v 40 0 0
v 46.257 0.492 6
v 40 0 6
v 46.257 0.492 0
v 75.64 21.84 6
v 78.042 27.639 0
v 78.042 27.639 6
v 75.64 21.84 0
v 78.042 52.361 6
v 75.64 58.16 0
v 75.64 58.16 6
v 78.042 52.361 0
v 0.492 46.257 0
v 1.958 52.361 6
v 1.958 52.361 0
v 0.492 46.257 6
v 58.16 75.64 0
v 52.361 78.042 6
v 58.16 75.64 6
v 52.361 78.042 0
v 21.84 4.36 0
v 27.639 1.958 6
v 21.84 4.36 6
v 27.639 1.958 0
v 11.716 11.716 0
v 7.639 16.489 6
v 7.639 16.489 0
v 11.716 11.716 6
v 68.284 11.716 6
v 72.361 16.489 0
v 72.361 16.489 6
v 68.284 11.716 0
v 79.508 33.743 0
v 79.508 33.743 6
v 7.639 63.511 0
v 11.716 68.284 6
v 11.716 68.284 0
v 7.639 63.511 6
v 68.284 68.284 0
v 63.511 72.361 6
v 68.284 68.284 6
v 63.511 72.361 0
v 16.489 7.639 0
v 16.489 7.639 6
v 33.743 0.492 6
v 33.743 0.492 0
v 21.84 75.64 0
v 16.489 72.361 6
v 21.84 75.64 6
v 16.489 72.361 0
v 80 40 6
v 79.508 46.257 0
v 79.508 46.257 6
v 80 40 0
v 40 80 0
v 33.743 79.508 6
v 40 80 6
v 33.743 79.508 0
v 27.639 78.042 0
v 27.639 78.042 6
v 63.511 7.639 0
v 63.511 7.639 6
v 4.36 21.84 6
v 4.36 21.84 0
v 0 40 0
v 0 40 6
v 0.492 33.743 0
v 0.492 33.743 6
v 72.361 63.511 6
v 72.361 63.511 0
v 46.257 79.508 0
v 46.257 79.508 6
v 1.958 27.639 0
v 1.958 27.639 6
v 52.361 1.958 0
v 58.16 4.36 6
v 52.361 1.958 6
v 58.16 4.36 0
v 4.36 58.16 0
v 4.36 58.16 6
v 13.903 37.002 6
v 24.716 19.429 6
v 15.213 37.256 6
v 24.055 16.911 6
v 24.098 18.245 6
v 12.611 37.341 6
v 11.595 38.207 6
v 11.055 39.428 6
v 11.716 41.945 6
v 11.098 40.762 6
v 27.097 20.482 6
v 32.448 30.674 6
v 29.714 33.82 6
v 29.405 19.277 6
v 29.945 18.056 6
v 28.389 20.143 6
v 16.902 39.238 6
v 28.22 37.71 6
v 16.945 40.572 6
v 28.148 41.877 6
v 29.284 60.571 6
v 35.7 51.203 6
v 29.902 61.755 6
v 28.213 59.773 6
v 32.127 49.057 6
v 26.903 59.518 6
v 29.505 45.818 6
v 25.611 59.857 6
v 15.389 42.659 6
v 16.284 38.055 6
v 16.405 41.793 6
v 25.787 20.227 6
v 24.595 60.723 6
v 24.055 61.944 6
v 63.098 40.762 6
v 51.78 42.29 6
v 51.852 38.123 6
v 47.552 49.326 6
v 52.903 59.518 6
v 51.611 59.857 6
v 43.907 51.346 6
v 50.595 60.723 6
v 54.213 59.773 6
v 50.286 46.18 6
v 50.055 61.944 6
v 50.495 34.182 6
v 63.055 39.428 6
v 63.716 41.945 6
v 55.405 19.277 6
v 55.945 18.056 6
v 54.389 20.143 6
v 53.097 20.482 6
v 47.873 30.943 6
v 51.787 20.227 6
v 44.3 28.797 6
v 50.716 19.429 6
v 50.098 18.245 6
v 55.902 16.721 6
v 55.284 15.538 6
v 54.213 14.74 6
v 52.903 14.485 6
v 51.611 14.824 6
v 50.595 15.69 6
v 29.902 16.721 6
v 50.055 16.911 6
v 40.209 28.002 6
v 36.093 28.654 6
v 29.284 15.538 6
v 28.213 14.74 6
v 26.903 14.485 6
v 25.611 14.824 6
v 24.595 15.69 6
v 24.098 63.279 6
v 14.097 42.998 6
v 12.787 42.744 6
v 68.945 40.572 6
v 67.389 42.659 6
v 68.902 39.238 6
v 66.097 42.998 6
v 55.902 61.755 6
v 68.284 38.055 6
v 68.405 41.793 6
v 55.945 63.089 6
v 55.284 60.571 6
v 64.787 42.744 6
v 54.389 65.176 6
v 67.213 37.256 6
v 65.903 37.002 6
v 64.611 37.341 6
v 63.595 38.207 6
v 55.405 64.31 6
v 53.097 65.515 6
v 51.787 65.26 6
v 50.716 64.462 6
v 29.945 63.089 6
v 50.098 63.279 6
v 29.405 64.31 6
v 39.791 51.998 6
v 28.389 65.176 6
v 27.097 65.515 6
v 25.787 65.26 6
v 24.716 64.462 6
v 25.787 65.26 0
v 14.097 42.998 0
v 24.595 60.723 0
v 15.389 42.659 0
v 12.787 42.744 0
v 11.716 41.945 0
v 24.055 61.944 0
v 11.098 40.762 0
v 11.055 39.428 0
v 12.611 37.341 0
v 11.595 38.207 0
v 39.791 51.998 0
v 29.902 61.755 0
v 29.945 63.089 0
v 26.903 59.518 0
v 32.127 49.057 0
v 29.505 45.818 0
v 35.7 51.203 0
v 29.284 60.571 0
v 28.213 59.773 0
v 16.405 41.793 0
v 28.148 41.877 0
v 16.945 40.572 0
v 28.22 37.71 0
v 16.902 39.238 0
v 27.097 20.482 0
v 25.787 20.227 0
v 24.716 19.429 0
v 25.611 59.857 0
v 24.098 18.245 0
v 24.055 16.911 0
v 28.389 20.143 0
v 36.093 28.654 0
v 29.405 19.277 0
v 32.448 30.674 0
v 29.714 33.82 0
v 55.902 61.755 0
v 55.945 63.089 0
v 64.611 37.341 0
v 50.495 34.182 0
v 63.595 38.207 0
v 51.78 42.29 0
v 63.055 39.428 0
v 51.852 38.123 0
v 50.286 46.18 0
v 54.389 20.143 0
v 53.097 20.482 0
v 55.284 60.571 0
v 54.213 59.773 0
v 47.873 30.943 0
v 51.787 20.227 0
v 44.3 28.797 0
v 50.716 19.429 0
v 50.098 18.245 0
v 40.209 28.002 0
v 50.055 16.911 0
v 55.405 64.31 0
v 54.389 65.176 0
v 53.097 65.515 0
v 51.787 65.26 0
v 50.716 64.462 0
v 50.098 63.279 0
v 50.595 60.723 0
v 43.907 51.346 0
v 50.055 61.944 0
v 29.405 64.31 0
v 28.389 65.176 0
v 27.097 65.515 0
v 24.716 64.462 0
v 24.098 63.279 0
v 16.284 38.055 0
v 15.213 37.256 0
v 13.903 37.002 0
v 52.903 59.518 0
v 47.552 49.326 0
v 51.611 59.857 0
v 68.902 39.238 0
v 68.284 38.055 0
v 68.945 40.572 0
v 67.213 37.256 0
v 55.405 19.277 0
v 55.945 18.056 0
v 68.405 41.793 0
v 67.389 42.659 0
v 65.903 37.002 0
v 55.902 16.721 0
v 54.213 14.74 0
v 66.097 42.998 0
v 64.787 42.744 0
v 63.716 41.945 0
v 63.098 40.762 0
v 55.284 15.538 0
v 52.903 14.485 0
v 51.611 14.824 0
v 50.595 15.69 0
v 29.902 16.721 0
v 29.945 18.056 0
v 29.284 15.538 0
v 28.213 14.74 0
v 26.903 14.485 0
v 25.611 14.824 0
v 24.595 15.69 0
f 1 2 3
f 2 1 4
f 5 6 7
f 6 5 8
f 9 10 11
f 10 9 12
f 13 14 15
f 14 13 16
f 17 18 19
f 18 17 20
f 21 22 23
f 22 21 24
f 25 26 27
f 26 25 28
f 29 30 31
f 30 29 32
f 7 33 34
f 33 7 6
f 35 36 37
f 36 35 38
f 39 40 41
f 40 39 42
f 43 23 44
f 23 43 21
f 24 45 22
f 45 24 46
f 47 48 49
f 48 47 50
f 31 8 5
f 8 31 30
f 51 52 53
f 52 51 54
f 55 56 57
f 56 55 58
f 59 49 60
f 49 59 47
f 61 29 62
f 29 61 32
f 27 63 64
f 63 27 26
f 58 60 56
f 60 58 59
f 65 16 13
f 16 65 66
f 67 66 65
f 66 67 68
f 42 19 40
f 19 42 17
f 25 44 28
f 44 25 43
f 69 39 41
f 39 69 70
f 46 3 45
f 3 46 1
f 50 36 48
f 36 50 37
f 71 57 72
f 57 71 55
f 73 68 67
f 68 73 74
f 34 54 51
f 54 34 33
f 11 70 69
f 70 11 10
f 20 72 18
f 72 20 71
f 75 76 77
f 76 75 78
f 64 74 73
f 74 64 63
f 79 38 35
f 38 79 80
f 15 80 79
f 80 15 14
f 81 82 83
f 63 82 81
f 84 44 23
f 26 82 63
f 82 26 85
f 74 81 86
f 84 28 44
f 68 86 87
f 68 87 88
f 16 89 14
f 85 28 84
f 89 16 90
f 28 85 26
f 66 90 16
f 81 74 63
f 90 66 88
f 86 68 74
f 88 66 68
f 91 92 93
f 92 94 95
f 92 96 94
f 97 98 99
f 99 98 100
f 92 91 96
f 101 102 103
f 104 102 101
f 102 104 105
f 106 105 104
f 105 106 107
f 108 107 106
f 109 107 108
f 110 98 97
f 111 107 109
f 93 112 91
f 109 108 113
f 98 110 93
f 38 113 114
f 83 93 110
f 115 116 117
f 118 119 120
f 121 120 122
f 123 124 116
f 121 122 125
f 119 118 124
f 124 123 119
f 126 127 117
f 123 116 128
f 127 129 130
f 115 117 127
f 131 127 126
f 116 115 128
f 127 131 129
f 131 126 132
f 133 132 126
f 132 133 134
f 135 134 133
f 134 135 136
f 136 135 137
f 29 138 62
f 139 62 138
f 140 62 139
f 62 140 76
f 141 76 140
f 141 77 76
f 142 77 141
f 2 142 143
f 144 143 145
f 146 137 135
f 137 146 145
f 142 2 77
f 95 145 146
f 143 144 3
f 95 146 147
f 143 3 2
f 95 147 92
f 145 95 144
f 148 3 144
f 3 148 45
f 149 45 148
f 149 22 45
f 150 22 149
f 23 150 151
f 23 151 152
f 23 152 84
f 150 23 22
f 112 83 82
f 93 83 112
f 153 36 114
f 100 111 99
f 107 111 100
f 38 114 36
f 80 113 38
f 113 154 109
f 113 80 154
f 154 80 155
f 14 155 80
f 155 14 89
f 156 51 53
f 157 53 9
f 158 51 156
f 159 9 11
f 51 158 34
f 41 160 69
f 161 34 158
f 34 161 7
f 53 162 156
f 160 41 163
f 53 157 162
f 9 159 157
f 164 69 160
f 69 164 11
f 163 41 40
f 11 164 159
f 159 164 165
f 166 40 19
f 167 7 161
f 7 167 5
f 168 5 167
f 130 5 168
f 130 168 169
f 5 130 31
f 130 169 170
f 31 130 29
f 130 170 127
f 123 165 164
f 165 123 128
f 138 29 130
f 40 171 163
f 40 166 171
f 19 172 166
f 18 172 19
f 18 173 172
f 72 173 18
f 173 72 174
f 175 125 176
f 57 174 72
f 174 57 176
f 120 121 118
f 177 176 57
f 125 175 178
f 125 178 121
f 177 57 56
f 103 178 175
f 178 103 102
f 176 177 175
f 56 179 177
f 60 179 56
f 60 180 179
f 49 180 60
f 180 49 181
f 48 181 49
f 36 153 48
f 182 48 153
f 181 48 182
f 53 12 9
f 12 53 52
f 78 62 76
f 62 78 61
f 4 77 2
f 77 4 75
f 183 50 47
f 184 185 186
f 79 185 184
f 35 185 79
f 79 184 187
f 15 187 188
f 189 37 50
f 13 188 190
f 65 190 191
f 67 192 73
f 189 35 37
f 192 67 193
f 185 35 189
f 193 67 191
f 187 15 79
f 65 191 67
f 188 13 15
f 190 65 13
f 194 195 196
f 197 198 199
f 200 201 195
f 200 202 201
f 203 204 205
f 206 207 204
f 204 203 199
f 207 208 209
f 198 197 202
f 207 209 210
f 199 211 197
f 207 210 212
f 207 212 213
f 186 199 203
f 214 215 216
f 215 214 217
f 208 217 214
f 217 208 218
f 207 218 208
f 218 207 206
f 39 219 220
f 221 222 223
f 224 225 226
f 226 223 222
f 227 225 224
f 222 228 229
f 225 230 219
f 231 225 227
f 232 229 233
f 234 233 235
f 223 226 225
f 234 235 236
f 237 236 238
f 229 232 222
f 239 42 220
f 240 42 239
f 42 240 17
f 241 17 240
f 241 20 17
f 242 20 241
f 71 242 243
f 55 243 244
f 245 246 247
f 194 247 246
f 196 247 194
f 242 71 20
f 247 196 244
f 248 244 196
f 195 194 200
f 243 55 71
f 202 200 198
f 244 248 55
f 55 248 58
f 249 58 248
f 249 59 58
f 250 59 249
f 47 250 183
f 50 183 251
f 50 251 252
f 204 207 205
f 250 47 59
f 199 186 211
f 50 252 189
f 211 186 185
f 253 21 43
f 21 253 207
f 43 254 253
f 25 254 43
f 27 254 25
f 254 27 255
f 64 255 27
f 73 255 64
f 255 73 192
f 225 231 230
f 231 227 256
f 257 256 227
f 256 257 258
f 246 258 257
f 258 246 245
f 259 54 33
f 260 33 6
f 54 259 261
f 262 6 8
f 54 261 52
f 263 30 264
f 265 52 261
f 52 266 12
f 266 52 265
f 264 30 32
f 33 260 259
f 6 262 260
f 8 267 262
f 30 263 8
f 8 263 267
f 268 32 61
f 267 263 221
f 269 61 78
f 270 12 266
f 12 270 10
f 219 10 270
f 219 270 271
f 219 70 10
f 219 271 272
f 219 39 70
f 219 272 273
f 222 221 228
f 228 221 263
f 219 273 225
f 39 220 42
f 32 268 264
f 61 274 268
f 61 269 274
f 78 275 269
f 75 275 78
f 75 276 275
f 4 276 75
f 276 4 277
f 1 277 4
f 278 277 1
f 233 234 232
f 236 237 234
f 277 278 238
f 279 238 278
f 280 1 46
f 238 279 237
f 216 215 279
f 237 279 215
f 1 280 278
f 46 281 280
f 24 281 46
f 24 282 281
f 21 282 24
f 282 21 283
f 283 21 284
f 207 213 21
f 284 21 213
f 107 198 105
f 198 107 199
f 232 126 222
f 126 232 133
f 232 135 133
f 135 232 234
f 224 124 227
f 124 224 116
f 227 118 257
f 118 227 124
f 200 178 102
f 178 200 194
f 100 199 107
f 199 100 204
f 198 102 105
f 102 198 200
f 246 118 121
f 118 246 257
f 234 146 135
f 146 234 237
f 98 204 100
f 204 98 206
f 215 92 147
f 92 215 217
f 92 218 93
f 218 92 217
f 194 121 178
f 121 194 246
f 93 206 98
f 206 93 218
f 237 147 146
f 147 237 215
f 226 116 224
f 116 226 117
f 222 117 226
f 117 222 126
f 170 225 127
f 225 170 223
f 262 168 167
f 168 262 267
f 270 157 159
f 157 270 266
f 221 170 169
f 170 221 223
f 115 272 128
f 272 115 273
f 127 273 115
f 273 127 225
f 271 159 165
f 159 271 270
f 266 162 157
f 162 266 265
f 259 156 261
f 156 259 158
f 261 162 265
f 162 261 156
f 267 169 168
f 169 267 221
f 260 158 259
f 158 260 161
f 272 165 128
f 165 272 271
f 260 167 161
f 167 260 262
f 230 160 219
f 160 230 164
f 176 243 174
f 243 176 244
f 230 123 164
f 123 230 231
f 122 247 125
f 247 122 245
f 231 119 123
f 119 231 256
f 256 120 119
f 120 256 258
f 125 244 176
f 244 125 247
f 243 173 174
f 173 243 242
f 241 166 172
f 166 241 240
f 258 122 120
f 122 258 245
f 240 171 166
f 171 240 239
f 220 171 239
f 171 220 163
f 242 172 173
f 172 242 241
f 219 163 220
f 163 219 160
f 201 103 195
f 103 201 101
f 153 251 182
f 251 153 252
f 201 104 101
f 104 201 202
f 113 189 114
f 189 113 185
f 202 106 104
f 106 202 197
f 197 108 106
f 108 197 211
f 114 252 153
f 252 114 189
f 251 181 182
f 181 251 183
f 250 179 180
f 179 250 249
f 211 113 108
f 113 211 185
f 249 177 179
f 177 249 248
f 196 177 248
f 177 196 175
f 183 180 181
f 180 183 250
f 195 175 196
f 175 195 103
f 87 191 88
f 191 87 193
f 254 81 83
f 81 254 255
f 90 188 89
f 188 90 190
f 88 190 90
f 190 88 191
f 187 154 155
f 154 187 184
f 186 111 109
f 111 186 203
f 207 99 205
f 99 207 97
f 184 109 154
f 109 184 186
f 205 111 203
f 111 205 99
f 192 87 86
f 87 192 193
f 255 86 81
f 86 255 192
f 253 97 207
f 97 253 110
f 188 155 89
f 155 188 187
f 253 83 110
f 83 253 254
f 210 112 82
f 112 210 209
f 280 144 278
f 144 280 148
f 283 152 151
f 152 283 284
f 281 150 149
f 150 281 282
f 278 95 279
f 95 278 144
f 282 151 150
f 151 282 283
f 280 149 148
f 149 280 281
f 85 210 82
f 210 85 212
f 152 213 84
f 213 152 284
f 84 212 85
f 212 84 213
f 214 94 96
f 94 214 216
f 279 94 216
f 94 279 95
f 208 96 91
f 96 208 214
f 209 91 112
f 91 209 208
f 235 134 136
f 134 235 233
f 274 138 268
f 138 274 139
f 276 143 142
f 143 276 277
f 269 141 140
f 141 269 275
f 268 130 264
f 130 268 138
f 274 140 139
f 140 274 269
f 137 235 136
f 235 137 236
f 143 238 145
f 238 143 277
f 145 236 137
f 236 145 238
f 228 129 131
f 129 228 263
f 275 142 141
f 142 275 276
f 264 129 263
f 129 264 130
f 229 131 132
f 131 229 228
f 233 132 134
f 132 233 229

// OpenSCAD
$fn = 32;

// ----------------------------------------------------------------------
// Spacer plate: round flange R40, 6 bolts
// ----------------------------------------------------------------------

// --- parameters (mm) ---
bore_r = 12;              // centre bore radius
bolt_r = 3;               // bolt hole radius
plate_t = 6;              // plate thickness, Z (extrusion height)
flange_r = 40;            // flange radius
n_bolt = 6;               // bolt hole count
ring_r = 26;              // bolt circle radius
fit_tol = 0.02;           // declared fit tolerance (prompt contract)
free_tol = 0.2;           // declared free tolerance (prompt contract)

profile = [[80, 40], [79.508, 46.257], [78.042, 52.361], [75.64, 58.16], [72.361, 63.511], [68.284, 68.284], [63.511, 72.361], [58.16, 75.64], [52.361, 78.042], [46.257, 79.508], [40, 80], [33.743, 79.508], [27.639, 78.042], [21.84, 75.64], [16.489, 72.361], [11.716, 68.284], [7.639, 63.511], [4.36, 58.16], [1.958, 52.361], [0.492, 46.257], [0, 40], [0.492, 33.743], [1.958, 27.639], [4.36, 21.84], [7.639, 16.489], [11.716, 11.716], [16.489, 7.639], [21.84, 4.36], [27.639, 1.958], [33.743, 0.492], [40, 0], [46.257, 0.492], [52.361, 1.958], [58.16, 4.36], [63.511, 7.639], [68.284, 11.716], [72.361, 16.489], [75.64, 21.84], [78.042, 27.639], [79.508, 33.743]];  // primary outline, 40 points, counter clockwise
void_1 = [[51.78, 42.29], [50.286, 46.18], [47.552, 49.326], [43.907, 51.346], [39.791, 51.998], [35.7, 51.203], [32.127, 49.057], [29.505, 45.818], [28.148, 41.877], [28.22, 37.71], [29.714, 33.82], [32.448, 30.674], [36.093, 28.654], [40.209, 28.002], [44.3, 28.797], [47.873, 30.943], [50.495, 34.182], [51.852, 38.123]];  // centre bore, 18 points
void_2 = [[68.945, 40.572], [68.405, 41.793], [67.389, 42.659], [66.097, 42.998], [64.787, 42.744], [63.716, 41.945], [63.098, 40.762], [63.055, 39.428], [63.595, 38.207], [64.611, 37.341], [65.903, 37.002], [67.213, 37.256], [68.284, 38.055], [68.902, 39.238]];  // bolt hole 1, 14 points
void_3 = [[55.945, 63.089], [55.405, 64.31], [54.389, 65.176], [53.097, 65.515], [51.787, 65.26], [50.716, 64.462], [50.098, 63.279], [50.055, 61.944], [50.595, 60.723], [51.611, 59.857], [52.903, 59.518], [54.213, 59.773], [55.284, 60.571], [55.902, 61.755]];  // bolt hole 2, 14 points
void_4 = [[29.945, 63.089], [29.405, 64.31], [28.389, 65.176], [27.097, 65.515], [25.787, 65.26], [24.716, 64.462], [24.098, 63.279], [24.055, 61.944], [24.595, 60.723], [25.611, 59.857], [26.903, 59.518], [28.213, 59.773], [29.284, 60.571], [29.902, 61.755]];  // bolt hole 3, 14 points
void_5 = [[16.945, 40.572], [16.405, 41.793], [15.389, 42.659], [14.097, 42.998], [12.787, 42.744], [11.716, 41.945], [11.098, 40.762], [11.055, 39.428], [11.595, 38.207], [12.611, 37.341], [13.903, 37.002], [15.213, 37.256], [16.284, 38.055], [16.902, 39.238]];  // bolt hole 4, 14 points
void_6 = [[29.945, 18.056], [29.405, 19.277], [28.389, 20.143], [27.097, 20.482], [25.787, 20.227], [24.716, 19.429], [24.098, 18.245], [24.055, 16.911], [24.595, 15.69], [25.611, 14.824], [26.903, 14.485], [28.213, 14.74], [29.284, 15.538], [29.902, 16.721]];  // bolt hole 5, 14 points
void_7 = [[55.945, 18.056], [55.405, 19.277], [54.389, 20.143], [53.097, 20.482], [51.787, 20.227], [50.716, 19.429], [50.098, 18.245], [50.055, 16.911], [50.595, 15.69], [51.611, 14.824], [52.903, 14.485], [54.213, 14.74], [55.284, 15.538], [55.902, 16.721]];  // bolt hole 6, 14 points

// --- the one profile operation ---
difference() {
  linear_extrude(height = plate_t) polygon(points = profile);
  translate([0, 0, -1])
    linear_extrude(height = plate_t + 2) polygon(points = void_1);
  translate([0, 0, -1])
    linear_extrude(height = plate_t + 2) polygon(points = void_2);
  translate([0, 0, -1])
    linear_extrude(height = plate_t + 2) polygon(points = void_3);
  translate([0, 0, -1])
    linear_extrude(height = plate_t + 2) polygon(points = void_4);
  translate([0, 0, -1])
    linear_extrude(height = plate_t + 2) polygon(points = void_5);
  translate([0, 0, -1])
    linear_extrude(height = plate_t + 2) polygon(points = void_6);
  translate([0, 0, -1])
    linear_extrude(height = plate_t + 2) polygon(points = void_7);
}
